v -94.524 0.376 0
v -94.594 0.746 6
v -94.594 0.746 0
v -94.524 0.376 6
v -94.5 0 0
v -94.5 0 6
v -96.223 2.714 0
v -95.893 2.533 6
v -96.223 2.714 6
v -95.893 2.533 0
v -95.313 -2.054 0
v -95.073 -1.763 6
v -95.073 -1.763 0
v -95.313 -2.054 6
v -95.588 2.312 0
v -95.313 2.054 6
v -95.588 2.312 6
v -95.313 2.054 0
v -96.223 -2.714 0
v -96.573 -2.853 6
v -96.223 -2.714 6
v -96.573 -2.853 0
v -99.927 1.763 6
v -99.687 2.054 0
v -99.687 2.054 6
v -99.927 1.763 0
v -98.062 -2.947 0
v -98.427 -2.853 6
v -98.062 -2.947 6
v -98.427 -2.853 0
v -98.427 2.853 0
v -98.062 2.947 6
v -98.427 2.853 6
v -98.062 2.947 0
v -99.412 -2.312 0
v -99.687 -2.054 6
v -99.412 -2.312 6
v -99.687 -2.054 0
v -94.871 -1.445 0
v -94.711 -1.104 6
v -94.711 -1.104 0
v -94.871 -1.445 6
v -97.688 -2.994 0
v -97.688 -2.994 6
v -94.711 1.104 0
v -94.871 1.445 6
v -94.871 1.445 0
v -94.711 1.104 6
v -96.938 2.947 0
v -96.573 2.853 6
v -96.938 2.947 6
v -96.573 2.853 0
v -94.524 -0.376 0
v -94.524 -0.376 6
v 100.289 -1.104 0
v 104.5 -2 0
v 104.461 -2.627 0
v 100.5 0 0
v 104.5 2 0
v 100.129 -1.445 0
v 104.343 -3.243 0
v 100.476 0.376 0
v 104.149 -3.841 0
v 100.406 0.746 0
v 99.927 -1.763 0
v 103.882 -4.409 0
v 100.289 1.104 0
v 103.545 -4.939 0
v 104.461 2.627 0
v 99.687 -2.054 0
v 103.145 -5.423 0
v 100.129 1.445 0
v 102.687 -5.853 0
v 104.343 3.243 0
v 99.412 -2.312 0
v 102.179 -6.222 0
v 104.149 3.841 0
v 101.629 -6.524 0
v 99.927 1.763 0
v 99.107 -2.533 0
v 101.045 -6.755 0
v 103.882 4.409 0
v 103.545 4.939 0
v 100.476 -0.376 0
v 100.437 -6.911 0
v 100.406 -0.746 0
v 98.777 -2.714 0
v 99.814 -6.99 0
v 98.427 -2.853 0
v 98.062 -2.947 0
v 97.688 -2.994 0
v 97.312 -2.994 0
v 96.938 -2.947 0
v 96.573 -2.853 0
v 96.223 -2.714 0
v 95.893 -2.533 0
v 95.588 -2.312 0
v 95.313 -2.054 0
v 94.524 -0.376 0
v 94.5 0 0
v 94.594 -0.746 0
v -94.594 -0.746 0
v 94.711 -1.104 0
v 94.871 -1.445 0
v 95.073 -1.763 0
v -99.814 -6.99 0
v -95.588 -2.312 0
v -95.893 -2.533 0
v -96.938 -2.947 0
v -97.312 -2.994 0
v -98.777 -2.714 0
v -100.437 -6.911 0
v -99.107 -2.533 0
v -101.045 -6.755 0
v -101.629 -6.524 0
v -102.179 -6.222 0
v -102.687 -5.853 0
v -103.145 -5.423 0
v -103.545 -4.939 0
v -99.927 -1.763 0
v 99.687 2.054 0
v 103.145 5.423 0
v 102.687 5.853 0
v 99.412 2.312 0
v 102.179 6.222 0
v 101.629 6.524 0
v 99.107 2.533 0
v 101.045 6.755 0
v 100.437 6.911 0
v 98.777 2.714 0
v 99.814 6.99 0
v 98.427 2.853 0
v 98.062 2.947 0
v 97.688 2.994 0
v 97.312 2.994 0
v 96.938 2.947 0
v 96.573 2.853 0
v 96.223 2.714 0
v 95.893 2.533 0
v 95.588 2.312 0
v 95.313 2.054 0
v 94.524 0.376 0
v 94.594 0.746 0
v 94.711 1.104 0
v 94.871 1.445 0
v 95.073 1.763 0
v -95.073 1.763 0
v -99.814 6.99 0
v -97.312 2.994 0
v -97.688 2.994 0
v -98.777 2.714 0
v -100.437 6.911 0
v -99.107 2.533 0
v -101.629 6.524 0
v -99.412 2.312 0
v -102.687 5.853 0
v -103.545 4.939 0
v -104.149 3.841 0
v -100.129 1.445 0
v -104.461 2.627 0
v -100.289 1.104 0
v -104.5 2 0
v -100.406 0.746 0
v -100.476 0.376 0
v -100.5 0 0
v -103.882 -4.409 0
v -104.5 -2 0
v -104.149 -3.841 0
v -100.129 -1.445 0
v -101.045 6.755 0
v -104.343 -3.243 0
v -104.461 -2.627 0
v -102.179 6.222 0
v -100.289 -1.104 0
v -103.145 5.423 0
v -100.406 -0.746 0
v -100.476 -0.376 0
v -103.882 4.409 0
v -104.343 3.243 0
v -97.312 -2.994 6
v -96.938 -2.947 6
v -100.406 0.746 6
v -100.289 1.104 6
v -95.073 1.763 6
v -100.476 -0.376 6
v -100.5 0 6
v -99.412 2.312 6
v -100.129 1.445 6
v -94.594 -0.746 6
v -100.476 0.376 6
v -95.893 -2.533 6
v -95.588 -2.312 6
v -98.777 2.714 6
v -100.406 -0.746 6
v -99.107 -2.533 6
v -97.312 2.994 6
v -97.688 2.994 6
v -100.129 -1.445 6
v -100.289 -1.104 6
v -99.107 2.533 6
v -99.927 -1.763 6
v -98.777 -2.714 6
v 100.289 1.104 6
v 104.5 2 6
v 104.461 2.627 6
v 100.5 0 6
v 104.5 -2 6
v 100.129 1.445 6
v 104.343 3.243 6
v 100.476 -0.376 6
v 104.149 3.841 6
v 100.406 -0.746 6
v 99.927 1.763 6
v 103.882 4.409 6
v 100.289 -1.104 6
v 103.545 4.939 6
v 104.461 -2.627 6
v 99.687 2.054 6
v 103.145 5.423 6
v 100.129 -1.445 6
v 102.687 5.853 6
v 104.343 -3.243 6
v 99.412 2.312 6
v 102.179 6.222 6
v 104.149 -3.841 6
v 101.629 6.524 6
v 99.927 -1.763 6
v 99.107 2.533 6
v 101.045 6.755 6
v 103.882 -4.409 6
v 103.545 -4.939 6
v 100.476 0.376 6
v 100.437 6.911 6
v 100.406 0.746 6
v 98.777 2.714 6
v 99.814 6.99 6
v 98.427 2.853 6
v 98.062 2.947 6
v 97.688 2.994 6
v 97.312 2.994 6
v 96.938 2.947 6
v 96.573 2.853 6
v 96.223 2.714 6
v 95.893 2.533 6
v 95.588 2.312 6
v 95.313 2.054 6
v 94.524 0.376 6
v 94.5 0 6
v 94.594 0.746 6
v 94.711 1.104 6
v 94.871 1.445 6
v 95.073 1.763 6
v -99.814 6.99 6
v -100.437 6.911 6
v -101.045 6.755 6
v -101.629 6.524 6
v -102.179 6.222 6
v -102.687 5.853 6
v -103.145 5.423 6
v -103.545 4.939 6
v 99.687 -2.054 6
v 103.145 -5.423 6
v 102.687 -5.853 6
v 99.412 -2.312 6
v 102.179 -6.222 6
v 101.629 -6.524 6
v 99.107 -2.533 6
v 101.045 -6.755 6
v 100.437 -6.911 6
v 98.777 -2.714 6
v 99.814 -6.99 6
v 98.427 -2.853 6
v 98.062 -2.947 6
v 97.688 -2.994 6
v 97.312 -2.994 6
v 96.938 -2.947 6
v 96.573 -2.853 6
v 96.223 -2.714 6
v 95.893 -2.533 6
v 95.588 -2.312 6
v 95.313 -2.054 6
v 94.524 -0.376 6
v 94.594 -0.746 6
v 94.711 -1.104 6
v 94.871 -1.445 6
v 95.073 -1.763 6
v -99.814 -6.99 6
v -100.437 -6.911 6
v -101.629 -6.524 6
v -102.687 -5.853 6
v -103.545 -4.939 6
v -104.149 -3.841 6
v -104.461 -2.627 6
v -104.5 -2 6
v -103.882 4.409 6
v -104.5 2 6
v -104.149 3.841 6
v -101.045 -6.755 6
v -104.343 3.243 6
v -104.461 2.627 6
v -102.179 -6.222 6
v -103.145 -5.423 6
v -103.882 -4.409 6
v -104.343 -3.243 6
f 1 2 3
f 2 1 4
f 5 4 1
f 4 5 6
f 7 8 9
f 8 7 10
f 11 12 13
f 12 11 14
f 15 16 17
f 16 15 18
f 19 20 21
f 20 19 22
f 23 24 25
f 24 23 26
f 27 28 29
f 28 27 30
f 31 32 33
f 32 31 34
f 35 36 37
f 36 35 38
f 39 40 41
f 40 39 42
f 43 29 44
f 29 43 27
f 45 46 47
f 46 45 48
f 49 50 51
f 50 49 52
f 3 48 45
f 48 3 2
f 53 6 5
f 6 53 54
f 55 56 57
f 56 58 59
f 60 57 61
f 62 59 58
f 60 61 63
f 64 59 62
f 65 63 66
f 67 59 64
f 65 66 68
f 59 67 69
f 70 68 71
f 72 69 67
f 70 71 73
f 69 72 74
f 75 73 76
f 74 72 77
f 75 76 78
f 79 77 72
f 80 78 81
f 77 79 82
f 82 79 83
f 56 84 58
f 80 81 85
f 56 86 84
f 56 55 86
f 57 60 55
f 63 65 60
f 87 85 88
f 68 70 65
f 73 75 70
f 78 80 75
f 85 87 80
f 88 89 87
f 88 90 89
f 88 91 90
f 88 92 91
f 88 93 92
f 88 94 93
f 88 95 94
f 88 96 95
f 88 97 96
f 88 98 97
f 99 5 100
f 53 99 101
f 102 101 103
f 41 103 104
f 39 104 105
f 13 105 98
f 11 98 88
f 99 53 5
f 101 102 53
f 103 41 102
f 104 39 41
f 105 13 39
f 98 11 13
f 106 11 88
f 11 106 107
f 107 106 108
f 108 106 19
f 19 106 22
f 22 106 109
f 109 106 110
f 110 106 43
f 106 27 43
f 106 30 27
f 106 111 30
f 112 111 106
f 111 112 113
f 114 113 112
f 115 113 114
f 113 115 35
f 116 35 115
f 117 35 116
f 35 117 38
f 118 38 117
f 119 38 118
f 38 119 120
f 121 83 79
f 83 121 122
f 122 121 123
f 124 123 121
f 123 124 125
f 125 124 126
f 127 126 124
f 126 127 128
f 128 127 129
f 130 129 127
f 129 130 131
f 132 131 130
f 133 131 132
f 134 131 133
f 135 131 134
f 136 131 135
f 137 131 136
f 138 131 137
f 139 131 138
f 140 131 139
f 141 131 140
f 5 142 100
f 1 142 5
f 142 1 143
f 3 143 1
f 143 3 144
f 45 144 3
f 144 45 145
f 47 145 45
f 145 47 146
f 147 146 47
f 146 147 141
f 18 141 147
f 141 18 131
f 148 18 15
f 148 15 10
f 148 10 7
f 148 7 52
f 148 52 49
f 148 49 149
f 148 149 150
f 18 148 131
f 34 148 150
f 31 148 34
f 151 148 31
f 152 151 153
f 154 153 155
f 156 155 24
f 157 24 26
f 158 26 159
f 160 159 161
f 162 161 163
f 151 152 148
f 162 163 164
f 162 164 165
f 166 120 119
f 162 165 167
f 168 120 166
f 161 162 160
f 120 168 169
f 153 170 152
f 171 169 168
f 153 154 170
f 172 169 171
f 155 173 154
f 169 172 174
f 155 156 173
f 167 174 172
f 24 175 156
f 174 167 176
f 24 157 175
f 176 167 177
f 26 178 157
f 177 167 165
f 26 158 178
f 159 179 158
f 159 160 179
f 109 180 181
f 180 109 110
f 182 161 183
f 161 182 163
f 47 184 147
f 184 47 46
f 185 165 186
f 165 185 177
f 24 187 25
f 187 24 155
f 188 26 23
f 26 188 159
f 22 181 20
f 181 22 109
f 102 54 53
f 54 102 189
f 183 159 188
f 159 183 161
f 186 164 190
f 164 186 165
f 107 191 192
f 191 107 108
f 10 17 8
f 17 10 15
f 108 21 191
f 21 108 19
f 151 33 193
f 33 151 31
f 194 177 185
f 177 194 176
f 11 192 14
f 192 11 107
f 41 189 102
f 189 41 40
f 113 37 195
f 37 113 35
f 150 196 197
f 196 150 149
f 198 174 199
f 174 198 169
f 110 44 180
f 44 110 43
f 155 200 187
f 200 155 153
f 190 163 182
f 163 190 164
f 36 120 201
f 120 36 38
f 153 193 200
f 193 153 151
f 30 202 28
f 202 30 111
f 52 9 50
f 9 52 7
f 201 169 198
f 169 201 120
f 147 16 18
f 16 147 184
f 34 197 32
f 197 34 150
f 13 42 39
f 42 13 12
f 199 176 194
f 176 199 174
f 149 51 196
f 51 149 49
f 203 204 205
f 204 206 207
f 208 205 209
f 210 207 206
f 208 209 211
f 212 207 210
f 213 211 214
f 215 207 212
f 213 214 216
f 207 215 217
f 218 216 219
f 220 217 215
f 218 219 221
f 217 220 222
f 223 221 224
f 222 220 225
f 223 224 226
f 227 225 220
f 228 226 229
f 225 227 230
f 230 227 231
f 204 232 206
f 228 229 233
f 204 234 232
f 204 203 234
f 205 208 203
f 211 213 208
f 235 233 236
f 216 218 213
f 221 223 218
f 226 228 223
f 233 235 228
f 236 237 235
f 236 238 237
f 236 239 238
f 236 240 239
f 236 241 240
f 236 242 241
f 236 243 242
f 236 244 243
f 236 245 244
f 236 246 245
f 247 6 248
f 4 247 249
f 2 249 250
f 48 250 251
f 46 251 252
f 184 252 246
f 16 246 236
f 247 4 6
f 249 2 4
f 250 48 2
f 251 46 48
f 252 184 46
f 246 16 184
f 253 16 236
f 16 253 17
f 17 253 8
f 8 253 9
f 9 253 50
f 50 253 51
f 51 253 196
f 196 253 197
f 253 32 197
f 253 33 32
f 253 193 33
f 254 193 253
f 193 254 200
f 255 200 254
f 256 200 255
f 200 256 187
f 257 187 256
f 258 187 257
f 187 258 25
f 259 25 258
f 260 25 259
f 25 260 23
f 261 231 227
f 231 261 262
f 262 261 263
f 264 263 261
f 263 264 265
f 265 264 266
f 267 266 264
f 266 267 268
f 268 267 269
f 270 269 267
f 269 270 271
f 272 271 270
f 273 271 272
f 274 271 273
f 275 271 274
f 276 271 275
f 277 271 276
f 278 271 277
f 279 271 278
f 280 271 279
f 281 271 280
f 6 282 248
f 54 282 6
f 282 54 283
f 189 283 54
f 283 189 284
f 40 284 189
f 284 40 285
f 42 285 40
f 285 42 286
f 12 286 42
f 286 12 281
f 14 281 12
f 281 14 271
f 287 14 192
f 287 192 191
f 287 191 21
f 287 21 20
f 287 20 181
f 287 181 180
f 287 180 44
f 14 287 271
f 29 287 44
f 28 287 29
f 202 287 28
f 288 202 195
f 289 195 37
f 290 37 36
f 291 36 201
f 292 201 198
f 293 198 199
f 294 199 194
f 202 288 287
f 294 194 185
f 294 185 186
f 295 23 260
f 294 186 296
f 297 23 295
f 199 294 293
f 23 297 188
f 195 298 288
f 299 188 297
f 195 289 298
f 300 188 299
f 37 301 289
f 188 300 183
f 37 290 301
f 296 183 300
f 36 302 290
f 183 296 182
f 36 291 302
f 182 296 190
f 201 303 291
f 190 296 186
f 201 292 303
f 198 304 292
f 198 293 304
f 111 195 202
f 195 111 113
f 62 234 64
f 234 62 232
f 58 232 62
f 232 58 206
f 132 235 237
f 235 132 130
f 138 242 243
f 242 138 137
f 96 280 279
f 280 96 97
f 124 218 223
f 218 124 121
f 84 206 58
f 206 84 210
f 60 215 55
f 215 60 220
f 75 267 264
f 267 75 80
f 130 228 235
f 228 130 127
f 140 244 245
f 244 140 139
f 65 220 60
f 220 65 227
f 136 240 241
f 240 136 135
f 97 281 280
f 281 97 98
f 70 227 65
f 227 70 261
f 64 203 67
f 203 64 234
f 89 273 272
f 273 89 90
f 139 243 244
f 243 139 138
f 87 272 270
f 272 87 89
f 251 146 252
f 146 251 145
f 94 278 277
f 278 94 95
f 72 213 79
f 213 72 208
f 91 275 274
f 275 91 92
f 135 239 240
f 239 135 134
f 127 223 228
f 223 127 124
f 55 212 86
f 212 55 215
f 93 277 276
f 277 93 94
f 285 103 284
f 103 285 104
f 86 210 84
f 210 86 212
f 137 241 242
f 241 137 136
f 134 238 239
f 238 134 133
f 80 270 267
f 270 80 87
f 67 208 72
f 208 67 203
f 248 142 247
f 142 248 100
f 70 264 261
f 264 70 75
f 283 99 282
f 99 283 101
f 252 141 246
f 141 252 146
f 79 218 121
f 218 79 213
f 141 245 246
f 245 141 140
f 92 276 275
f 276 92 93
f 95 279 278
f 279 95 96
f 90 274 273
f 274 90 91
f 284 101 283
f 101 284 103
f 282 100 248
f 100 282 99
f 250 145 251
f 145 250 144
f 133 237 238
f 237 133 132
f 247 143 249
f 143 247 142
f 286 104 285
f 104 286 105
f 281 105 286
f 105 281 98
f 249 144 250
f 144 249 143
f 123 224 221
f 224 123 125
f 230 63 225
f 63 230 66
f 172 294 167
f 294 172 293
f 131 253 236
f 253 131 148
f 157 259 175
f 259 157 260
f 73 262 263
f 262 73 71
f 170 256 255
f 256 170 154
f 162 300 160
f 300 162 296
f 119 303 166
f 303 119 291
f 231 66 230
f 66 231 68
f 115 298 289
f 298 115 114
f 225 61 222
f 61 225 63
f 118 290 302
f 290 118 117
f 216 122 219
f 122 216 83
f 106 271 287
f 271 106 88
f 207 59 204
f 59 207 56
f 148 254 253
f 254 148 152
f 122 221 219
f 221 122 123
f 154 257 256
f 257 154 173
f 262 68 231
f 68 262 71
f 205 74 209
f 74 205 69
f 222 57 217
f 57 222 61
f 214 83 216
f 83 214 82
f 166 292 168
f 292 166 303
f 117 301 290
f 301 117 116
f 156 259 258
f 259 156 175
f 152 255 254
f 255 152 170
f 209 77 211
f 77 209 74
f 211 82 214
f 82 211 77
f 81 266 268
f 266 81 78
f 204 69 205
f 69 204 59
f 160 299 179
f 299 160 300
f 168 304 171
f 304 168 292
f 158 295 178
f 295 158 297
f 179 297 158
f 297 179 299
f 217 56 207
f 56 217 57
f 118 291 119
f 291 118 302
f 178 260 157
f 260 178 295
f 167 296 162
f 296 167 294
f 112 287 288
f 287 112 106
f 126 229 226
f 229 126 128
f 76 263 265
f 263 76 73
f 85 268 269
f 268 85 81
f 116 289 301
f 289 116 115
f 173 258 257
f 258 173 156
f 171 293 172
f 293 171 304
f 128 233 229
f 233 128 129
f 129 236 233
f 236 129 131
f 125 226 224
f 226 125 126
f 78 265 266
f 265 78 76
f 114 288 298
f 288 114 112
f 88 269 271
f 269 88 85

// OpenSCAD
$fn = 50;


difference() {
	union() {
		hull() {
			translate(v = [-99.5000000000, 2.0000000000, 0]) {
				cylinder(h = 6, r = 5);
			}
			translate(v = [99.5000000000, 2.0000000000, 0]) {
				cylinder(h = 6, r = 5);
			}
			translate(v = [-99.5000000000, -2.0000000000, 0]) {
				cylinder(h = 6, r = 5);
			}
			translate(v = [99.5000000000, -2.0000000000, 0]) {
				cylinder(h = 6, r = 5);
			}
		}
	}
	union() {
		translate(v = [-97.5000000000, 0.0000000000, 0]) {
			cylinder(h = 6, r = 3.0000000000);
		}
		translate(v = [97.5000000000, 0.0000000000, 0]) {
			cylinder(h = 6, r = 3.0000000000);
		}
		translate(v = [-97.5000000000, 0.0000000000, 0]) {
			cylinder(h = 6, r = 1.5000000000);
		}
		translate(v = [97.5000000000, 0.0000000000, 0]) {
			cylinder(h = 6, r = 1.5000000000);
		}
		translate(v = [-97.5000000000, 0.0000000000, 0]) {
			cylinder(h = 6, r = 1.5000000000);
		}
		translate(v = [97.5000000000, 0.0000000000, 0]) {
			cylinder(h = 6, r = 1.5000000000);
		}
		translate(v = [-97.5000000000, 0.0000000000, 0]) {
			cylinder(h = 6, r = 1.5000000000);
		}
		translate(v = [97.5000000000, 0.0000000000, 0]) {
			cylinder(h = 6, r = 1.5000000000);
		}
	}
}
